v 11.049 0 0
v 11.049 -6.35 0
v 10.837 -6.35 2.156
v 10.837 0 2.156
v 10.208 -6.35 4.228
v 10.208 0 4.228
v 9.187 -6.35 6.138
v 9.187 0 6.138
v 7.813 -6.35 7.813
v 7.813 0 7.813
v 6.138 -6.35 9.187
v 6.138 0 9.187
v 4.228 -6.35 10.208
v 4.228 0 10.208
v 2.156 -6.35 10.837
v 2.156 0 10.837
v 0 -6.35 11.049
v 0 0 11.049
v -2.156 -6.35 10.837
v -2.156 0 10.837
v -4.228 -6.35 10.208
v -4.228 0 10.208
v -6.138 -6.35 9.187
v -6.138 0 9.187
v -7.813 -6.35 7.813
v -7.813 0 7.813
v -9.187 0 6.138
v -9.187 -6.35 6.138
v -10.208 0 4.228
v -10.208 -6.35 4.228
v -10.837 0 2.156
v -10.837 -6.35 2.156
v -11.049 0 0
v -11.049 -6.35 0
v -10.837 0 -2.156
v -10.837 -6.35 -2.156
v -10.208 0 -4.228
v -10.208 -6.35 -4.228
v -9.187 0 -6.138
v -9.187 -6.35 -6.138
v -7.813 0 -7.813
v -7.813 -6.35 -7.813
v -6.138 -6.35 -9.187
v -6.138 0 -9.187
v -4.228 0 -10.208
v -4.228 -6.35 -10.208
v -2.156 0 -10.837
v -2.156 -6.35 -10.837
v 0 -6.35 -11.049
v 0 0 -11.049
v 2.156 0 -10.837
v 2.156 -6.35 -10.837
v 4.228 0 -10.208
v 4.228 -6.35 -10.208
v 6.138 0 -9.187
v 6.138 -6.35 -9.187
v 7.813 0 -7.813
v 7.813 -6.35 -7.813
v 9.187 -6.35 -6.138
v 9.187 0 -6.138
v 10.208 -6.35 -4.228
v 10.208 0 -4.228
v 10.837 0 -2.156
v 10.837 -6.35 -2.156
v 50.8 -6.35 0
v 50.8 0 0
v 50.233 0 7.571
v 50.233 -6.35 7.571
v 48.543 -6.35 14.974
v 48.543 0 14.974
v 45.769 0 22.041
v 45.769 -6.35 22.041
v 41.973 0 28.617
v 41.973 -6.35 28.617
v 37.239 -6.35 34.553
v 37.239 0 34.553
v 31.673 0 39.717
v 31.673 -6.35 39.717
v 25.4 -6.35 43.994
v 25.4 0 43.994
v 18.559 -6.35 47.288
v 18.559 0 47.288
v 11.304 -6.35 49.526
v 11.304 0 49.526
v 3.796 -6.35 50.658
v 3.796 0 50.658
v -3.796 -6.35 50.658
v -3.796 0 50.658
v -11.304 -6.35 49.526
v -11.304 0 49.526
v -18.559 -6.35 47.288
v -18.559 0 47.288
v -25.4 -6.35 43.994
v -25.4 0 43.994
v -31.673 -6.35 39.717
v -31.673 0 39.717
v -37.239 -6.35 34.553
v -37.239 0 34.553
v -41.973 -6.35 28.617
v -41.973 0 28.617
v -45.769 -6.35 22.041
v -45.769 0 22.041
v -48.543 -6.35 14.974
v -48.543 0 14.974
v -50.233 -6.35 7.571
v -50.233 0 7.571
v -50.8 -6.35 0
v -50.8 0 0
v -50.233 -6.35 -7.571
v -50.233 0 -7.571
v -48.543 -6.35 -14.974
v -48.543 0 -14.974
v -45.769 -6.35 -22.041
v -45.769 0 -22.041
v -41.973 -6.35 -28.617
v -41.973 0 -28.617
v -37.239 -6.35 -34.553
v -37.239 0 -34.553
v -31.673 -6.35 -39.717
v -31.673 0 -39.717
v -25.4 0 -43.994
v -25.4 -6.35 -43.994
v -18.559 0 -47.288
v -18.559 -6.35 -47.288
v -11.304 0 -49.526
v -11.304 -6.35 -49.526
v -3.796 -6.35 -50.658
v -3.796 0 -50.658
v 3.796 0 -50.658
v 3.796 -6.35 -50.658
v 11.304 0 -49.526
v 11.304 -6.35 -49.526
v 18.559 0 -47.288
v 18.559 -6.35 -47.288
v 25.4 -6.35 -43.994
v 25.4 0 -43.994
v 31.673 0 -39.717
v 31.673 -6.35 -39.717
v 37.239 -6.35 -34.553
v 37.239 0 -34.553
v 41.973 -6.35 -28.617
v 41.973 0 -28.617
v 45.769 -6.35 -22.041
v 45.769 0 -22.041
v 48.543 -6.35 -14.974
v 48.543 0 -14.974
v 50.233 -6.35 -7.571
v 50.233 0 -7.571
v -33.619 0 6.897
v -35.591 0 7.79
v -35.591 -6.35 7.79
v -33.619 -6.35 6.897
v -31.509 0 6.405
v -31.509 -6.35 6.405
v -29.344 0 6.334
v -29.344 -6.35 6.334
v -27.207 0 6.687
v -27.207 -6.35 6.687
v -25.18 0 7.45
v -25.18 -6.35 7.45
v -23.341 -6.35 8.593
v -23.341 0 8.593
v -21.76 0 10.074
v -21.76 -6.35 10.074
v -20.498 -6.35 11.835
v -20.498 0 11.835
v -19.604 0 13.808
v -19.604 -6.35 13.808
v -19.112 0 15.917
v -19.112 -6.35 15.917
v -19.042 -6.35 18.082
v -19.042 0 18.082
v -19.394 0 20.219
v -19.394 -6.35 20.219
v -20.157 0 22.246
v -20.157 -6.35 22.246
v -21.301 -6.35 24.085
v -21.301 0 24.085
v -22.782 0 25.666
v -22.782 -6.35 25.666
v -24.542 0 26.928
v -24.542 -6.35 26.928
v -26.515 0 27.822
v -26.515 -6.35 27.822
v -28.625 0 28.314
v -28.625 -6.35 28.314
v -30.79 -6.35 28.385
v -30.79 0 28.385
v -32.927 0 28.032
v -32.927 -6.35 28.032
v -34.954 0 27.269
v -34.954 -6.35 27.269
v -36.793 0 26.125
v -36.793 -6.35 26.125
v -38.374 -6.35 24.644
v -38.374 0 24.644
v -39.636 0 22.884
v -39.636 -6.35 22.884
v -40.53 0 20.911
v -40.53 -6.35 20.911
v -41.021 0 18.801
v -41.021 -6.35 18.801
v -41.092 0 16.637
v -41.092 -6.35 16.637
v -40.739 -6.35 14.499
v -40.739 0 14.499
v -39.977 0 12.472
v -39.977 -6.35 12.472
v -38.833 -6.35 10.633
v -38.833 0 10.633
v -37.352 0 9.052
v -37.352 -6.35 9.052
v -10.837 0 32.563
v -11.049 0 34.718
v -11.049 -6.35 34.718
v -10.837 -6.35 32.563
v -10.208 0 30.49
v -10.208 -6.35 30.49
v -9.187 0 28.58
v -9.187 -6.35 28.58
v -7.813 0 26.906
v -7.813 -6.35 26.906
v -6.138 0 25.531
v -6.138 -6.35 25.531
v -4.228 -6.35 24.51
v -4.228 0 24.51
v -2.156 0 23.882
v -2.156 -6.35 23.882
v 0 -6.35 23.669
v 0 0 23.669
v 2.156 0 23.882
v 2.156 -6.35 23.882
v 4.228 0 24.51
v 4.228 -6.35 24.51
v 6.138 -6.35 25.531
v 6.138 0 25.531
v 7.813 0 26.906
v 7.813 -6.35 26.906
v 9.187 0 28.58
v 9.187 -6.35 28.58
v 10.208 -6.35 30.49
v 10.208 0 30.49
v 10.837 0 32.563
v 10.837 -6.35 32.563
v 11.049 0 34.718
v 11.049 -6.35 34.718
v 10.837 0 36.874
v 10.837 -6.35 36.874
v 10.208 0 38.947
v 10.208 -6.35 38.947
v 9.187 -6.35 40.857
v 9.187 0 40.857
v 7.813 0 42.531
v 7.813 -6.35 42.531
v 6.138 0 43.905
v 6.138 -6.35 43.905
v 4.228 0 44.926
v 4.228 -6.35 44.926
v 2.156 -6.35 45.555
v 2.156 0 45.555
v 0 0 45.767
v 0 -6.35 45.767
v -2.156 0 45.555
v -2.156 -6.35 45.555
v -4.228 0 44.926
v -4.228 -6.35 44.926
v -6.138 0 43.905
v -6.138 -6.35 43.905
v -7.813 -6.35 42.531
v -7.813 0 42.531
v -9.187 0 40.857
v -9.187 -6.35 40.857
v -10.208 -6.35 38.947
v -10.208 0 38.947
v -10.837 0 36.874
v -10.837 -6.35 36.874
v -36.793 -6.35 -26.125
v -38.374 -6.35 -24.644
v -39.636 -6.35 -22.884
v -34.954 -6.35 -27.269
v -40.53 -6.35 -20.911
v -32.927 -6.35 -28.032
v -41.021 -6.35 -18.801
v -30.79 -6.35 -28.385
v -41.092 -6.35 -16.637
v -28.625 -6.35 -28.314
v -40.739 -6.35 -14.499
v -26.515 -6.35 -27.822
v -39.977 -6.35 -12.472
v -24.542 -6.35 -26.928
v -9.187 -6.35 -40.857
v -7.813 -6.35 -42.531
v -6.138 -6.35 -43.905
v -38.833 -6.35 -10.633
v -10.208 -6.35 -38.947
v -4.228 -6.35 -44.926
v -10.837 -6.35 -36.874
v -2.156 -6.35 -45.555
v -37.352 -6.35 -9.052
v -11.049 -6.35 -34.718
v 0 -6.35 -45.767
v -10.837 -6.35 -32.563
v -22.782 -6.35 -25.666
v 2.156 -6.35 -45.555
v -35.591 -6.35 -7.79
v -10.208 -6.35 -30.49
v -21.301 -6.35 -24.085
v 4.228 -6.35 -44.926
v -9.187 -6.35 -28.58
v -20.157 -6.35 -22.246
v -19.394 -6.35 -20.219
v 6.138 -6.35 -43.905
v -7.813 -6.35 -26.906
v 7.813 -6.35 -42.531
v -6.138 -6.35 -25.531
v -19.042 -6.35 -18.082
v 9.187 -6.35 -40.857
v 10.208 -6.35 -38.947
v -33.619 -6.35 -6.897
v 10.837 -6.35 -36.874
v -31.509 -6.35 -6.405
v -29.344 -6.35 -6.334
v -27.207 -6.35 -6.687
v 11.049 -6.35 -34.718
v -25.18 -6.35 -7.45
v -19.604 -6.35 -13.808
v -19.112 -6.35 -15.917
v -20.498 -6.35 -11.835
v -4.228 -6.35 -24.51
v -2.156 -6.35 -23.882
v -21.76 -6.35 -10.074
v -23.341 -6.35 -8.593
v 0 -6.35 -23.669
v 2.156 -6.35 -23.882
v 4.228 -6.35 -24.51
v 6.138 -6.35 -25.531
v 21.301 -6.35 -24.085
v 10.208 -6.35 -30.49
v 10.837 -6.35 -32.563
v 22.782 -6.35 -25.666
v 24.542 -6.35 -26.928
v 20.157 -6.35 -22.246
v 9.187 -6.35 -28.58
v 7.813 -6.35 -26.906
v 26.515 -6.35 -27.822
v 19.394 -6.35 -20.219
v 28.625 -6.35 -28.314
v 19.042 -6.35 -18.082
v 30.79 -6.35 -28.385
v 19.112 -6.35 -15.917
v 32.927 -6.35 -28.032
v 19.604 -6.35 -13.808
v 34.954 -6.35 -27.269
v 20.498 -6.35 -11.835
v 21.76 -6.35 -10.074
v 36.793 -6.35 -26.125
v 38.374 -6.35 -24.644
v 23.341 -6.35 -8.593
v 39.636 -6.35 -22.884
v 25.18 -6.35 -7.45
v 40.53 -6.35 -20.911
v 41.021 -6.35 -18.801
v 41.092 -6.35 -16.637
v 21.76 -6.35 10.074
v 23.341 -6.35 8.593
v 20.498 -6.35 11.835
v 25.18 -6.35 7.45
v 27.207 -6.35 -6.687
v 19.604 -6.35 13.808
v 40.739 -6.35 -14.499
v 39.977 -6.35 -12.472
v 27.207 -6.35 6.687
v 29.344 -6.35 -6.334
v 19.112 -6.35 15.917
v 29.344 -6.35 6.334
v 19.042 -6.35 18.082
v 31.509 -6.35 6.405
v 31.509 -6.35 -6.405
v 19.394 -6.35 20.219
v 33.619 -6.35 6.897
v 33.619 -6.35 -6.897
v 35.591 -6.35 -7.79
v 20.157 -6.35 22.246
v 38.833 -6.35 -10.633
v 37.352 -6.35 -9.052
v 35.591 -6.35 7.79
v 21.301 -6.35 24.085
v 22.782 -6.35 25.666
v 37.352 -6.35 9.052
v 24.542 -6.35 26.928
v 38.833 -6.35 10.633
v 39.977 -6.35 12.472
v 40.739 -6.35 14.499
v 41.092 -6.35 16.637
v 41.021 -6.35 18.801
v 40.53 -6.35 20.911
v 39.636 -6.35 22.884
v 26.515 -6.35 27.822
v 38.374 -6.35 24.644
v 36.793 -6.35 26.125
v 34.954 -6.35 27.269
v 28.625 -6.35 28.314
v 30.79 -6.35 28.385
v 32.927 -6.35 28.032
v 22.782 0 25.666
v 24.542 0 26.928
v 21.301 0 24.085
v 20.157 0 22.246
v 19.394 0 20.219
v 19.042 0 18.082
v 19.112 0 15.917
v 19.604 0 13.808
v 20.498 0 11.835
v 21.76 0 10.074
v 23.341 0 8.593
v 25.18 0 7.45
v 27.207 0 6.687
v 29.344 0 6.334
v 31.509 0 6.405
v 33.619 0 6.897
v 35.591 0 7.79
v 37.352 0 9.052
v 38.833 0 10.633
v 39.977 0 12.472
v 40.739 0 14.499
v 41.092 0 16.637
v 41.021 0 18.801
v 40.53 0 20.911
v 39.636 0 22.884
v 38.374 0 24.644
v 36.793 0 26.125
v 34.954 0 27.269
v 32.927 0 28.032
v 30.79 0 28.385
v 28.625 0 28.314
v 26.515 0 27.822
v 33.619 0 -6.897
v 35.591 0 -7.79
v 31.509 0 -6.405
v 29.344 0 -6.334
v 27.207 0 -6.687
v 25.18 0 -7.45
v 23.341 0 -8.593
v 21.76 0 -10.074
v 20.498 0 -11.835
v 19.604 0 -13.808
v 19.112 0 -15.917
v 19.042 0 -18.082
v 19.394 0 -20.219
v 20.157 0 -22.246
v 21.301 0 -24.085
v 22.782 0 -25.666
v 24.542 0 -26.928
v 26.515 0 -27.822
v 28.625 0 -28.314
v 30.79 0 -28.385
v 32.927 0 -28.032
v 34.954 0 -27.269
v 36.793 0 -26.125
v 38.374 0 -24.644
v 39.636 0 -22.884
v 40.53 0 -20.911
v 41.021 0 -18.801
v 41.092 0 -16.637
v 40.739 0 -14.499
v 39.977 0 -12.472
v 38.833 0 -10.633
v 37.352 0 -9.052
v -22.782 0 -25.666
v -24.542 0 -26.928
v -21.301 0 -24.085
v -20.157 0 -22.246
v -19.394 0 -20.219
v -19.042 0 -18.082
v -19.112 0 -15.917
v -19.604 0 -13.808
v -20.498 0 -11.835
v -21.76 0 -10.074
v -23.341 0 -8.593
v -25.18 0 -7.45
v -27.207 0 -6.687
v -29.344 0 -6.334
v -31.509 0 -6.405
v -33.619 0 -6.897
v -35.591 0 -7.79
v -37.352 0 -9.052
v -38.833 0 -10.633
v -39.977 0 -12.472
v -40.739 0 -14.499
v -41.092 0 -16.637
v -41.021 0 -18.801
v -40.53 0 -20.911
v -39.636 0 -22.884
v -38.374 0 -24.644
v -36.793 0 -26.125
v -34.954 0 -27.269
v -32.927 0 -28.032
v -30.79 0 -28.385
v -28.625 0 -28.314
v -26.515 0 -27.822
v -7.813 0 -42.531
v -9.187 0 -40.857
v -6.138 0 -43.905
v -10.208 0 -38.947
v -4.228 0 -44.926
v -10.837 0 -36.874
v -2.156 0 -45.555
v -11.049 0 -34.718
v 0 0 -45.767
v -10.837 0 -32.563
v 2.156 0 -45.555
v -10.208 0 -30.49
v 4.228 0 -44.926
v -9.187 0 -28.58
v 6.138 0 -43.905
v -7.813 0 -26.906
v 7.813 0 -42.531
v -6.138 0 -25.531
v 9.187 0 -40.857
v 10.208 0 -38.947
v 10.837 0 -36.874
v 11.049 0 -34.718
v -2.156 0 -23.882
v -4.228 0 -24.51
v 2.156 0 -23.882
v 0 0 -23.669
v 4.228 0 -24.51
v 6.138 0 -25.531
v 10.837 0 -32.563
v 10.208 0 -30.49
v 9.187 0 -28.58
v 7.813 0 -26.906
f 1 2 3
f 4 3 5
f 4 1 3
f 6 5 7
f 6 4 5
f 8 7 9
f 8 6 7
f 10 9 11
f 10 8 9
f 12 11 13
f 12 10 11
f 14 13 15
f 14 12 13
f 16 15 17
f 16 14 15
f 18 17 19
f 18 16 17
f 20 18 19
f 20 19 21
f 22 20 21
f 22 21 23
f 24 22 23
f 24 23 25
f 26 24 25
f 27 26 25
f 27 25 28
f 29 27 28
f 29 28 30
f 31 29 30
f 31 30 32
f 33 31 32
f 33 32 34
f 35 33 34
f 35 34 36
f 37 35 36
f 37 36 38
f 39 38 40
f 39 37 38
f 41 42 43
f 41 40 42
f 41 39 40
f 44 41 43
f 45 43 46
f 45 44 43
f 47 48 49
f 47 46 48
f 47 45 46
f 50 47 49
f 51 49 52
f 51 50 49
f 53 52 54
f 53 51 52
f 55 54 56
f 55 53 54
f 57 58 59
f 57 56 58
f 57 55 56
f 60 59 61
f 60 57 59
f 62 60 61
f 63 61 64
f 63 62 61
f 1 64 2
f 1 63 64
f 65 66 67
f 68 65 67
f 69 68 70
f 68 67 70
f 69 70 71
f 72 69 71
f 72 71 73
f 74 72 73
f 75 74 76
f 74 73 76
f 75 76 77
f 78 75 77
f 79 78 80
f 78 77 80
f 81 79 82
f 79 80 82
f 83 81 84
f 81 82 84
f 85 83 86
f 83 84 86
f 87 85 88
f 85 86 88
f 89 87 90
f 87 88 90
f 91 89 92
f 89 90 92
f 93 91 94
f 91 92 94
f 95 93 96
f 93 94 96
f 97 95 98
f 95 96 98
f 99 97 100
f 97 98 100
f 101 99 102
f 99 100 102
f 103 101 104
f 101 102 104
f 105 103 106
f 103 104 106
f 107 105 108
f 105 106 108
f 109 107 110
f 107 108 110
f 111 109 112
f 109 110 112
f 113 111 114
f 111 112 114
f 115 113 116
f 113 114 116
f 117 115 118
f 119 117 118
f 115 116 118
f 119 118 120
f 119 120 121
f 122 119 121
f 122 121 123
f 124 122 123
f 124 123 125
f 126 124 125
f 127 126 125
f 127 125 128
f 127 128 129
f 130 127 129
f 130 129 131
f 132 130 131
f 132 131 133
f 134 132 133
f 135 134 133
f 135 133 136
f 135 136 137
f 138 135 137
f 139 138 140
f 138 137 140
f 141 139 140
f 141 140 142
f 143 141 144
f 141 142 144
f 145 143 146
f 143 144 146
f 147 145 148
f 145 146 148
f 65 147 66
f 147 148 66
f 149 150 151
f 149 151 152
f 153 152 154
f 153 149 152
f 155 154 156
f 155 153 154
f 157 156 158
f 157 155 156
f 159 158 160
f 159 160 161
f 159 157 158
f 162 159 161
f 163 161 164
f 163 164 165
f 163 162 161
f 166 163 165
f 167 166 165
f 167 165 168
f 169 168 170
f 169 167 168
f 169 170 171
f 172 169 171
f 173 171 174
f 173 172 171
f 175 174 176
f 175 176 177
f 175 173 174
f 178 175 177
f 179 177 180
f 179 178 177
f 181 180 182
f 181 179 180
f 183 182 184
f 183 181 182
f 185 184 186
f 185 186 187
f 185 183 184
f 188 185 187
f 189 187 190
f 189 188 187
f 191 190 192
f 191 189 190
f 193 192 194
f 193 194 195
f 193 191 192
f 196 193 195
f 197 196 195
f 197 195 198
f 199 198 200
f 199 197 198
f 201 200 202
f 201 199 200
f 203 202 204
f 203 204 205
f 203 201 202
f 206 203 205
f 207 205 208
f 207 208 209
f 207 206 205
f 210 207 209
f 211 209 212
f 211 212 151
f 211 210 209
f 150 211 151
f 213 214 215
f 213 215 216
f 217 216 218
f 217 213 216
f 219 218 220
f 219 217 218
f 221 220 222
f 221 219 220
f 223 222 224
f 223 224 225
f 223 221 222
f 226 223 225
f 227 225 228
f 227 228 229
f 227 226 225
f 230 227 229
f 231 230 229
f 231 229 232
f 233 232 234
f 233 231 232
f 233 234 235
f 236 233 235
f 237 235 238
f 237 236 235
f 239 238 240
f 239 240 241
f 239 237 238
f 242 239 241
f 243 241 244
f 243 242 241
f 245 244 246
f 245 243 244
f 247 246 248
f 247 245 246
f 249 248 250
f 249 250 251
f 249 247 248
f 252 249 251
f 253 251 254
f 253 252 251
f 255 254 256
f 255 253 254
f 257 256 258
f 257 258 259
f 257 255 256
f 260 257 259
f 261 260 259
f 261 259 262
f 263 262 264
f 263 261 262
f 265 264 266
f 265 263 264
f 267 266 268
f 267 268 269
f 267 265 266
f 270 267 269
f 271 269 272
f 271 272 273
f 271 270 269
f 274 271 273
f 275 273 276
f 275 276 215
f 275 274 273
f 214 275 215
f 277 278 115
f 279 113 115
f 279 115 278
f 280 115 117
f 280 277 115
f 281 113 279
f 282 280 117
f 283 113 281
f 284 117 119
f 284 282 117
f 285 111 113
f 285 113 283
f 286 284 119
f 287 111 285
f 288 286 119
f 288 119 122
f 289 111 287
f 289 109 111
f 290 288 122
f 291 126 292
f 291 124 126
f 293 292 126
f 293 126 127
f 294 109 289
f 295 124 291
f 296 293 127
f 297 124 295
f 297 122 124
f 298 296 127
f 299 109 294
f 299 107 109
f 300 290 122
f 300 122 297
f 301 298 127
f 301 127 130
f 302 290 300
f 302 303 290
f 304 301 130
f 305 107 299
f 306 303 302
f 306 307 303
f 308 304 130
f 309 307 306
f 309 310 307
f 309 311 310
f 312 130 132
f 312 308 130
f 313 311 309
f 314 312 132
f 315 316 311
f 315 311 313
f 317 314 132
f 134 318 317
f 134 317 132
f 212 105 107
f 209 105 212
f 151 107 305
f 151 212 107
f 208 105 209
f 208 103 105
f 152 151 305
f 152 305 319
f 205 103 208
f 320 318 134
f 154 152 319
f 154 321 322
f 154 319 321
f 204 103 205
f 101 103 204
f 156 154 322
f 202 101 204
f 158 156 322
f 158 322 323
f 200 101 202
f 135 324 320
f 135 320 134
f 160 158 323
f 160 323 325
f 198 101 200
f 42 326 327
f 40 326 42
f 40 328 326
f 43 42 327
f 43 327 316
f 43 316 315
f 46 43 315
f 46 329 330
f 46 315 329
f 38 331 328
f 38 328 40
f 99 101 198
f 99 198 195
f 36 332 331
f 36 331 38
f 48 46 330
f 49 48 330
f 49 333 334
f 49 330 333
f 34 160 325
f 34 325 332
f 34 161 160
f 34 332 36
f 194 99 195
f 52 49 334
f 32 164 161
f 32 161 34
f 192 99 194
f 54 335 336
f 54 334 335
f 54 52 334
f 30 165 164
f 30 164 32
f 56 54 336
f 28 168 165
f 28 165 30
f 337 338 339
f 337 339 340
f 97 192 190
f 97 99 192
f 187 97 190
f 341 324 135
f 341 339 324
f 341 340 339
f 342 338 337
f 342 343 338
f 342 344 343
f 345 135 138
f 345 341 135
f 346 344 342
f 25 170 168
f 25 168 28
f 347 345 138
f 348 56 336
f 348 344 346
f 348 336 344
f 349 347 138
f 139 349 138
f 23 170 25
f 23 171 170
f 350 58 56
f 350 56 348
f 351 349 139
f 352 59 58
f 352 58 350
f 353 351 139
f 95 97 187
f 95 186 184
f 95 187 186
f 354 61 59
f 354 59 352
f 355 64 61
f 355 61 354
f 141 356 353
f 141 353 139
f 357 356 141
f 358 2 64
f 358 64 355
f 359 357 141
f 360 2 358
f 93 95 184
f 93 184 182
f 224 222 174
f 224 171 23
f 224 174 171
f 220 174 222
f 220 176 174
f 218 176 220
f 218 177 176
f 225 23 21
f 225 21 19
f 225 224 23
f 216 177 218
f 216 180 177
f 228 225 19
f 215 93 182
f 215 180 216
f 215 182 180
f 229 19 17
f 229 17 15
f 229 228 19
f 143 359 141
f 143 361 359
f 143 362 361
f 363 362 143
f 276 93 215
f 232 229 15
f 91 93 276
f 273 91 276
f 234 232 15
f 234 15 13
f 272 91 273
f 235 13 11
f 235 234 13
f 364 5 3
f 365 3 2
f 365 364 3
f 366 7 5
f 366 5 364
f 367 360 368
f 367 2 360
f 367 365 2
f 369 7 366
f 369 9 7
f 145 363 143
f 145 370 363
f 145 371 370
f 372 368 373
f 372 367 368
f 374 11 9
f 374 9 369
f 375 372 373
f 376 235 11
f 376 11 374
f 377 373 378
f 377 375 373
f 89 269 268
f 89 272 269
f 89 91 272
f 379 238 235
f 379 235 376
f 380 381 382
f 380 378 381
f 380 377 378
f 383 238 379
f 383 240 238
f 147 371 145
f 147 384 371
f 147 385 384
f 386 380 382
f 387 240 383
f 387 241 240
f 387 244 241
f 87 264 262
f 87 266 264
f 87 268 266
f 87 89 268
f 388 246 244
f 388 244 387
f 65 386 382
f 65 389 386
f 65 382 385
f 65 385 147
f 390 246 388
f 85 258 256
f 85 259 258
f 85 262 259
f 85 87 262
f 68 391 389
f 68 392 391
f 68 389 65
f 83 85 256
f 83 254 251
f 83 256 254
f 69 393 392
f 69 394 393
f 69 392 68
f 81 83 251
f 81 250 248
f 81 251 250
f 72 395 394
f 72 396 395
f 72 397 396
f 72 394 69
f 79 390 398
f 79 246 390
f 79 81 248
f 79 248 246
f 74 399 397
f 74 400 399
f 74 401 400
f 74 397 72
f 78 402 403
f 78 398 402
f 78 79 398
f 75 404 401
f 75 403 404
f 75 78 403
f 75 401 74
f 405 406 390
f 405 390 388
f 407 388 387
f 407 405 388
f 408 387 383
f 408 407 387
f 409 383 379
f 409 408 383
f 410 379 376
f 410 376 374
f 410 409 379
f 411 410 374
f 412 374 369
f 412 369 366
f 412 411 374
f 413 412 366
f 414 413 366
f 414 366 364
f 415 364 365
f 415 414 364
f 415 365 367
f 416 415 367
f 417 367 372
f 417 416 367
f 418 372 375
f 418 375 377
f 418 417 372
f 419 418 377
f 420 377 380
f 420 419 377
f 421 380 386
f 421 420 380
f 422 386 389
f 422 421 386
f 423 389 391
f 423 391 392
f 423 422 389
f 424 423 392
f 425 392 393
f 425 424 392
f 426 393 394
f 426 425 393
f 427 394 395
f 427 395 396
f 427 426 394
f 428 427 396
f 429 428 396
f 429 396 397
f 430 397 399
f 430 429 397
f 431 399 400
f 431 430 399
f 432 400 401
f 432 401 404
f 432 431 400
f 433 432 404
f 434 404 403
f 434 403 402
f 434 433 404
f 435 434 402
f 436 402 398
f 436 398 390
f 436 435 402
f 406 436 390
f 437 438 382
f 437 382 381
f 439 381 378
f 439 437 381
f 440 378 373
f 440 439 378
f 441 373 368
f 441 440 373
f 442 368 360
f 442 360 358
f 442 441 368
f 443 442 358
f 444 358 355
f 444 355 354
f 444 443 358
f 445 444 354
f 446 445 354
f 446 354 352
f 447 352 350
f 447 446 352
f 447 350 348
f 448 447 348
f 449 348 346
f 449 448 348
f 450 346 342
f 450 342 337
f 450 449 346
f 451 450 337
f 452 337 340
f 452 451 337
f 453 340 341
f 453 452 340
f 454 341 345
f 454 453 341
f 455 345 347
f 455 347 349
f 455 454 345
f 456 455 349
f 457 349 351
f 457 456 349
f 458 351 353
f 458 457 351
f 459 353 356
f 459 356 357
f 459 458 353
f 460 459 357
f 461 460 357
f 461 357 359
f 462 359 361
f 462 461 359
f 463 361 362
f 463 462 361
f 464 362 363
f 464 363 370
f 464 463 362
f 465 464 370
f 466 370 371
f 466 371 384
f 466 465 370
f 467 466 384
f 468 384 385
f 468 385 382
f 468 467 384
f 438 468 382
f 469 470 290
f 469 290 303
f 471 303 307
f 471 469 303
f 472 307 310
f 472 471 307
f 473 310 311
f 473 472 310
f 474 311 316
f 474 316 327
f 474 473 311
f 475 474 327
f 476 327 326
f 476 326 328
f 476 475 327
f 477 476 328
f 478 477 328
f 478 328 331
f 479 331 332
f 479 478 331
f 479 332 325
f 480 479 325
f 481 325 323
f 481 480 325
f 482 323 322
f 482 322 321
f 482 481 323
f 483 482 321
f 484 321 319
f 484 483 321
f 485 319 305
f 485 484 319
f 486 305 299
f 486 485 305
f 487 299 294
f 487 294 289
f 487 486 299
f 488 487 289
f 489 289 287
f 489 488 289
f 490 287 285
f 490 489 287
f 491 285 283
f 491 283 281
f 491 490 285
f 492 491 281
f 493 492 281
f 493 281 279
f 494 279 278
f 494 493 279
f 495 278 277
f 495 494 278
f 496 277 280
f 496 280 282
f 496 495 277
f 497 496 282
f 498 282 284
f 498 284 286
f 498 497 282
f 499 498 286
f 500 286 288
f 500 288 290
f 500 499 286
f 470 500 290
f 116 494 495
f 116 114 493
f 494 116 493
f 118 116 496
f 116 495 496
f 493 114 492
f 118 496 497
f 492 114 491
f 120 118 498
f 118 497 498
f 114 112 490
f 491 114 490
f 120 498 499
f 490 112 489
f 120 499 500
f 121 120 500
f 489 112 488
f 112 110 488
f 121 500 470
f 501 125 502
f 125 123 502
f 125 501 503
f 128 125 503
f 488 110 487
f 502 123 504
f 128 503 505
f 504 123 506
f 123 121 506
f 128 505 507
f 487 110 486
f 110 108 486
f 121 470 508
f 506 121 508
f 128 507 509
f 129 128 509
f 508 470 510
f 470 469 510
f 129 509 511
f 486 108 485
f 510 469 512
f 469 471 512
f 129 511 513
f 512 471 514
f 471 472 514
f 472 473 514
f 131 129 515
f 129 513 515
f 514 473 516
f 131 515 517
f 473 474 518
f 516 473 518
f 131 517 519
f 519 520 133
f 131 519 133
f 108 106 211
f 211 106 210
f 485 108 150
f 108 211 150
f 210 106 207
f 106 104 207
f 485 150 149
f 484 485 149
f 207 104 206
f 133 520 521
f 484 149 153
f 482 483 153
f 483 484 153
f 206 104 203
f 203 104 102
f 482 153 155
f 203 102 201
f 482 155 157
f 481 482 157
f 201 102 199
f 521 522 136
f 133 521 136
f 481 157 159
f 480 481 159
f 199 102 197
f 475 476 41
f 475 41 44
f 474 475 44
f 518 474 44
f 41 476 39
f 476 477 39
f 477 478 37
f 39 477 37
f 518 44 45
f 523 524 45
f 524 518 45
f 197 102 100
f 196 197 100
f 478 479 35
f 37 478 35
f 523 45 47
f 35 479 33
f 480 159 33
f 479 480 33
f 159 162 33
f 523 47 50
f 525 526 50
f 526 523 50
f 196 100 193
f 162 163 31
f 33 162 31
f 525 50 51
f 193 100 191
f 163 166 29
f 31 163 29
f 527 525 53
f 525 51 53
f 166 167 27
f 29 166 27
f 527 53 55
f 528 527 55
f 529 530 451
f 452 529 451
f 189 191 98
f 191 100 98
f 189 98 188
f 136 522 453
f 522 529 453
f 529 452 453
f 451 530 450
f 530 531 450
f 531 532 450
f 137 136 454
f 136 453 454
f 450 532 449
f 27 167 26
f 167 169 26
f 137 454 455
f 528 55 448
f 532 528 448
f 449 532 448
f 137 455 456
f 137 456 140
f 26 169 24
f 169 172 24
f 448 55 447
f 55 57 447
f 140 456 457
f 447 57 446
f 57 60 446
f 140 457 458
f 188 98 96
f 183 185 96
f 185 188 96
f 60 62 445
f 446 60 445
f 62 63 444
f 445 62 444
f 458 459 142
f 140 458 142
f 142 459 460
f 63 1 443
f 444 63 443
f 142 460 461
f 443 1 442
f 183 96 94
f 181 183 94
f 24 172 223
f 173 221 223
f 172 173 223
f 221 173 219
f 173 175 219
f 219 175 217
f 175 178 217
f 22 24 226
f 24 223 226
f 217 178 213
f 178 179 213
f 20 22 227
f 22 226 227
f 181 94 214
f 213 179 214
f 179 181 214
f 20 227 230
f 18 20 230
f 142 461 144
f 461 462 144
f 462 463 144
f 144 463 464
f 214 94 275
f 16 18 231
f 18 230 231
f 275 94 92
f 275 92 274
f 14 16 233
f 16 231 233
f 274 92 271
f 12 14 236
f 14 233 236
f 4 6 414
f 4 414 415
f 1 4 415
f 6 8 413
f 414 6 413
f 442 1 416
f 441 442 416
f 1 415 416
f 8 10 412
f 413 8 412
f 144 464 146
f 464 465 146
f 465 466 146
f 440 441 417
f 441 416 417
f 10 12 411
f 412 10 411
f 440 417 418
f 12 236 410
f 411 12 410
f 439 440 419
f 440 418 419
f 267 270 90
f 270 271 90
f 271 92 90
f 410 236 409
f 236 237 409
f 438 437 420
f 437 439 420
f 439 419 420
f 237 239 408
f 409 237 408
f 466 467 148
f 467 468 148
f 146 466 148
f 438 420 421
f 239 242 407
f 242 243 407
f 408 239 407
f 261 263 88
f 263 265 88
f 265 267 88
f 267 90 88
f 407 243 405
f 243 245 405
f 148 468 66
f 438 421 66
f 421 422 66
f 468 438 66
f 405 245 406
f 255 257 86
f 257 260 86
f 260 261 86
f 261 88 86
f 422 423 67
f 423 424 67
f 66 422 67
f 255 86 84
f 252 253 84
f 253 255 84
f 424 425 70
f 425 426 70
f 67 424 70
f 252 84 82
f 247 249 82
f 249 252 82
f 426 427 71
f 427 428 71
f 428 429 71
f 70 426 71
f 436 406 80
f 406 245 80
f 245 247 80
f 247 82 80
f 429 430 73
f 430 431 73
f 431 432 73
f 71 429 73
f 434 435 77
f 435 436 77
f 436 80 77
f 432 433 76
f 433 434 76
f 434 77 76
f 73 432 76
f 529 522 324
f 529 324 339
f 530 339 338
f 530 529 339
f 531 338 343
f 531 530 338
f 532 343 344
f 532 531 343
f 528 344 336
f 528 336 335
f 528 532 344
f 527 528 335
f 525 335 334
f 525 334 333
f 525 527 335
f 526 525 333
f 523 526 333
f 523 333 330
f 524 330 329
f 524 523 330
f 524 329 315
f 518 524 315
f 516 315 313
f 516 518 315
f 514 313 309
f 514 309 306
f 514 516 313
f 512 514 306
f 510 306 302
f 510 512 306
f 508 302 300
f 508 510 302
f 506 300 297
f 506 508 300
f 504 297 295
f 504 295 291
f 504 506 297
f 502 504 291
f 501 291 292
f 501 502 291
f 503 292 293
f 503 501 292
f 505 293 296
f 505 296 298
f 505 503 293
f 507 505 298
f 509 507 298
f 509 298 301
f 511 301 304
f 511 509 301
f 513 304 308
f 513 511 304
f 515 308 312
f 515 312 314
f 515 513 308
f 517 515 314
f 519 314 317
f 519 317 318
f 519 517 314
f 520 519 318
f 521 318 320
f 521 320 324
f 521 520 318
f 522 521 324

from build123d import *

# Parameters (mm, degrees)
F0_R            = 50.8
F2_DEPTH        = 6.35
F1_R            = 11.049
F3_DEPTH        = 10.414
F5_R            = 11.049
F6_DEPTH        = 6.35
F6_COPIES_COUNT = 6


# Not quite as in the source:
# - a pattern or mirror of a feature is missing from the dataset's text; its kind, count and spacing are read off the source's solid
# - a feature names something its author has since deleted; it is built from what else it names


with BuildPart() as f2:
    # F0 (on Front) → F2 (new body)
    with BuildSketch(Plane.XZ):
        Circle(F0_R)
    extrude(amount=F2_DEPTH)

    # F1 (on Front) → F3 (cut)
    with BuildSketch(Plane.XZ):
        Circle(F1_R)
    extrude(amount=F3_DEPTH, mode=Mode.SUBTRACT)

    # F5 (on Front) → F6 (cut)
    with BuildSketch(Plane.XZ):
        with Locations((0, -34.7183458507)):
            Circle(F5_R)
    f6 = extrude(amount=F6_DEPTH, mode=Mode.SUBTRACT)

    # F6_copies: F6 ×6 about axis
    f6_copies_axis = Axis((0, 0, 0), (0, 1, 0))
    for i in range(1, F6_COPIES_COUNT):
        add(f6.rotate(f6_copies_axis, i * 360 / F6_COPIES_COUNT), mode=Mode.SUBTRACT)


solid = f2.part
